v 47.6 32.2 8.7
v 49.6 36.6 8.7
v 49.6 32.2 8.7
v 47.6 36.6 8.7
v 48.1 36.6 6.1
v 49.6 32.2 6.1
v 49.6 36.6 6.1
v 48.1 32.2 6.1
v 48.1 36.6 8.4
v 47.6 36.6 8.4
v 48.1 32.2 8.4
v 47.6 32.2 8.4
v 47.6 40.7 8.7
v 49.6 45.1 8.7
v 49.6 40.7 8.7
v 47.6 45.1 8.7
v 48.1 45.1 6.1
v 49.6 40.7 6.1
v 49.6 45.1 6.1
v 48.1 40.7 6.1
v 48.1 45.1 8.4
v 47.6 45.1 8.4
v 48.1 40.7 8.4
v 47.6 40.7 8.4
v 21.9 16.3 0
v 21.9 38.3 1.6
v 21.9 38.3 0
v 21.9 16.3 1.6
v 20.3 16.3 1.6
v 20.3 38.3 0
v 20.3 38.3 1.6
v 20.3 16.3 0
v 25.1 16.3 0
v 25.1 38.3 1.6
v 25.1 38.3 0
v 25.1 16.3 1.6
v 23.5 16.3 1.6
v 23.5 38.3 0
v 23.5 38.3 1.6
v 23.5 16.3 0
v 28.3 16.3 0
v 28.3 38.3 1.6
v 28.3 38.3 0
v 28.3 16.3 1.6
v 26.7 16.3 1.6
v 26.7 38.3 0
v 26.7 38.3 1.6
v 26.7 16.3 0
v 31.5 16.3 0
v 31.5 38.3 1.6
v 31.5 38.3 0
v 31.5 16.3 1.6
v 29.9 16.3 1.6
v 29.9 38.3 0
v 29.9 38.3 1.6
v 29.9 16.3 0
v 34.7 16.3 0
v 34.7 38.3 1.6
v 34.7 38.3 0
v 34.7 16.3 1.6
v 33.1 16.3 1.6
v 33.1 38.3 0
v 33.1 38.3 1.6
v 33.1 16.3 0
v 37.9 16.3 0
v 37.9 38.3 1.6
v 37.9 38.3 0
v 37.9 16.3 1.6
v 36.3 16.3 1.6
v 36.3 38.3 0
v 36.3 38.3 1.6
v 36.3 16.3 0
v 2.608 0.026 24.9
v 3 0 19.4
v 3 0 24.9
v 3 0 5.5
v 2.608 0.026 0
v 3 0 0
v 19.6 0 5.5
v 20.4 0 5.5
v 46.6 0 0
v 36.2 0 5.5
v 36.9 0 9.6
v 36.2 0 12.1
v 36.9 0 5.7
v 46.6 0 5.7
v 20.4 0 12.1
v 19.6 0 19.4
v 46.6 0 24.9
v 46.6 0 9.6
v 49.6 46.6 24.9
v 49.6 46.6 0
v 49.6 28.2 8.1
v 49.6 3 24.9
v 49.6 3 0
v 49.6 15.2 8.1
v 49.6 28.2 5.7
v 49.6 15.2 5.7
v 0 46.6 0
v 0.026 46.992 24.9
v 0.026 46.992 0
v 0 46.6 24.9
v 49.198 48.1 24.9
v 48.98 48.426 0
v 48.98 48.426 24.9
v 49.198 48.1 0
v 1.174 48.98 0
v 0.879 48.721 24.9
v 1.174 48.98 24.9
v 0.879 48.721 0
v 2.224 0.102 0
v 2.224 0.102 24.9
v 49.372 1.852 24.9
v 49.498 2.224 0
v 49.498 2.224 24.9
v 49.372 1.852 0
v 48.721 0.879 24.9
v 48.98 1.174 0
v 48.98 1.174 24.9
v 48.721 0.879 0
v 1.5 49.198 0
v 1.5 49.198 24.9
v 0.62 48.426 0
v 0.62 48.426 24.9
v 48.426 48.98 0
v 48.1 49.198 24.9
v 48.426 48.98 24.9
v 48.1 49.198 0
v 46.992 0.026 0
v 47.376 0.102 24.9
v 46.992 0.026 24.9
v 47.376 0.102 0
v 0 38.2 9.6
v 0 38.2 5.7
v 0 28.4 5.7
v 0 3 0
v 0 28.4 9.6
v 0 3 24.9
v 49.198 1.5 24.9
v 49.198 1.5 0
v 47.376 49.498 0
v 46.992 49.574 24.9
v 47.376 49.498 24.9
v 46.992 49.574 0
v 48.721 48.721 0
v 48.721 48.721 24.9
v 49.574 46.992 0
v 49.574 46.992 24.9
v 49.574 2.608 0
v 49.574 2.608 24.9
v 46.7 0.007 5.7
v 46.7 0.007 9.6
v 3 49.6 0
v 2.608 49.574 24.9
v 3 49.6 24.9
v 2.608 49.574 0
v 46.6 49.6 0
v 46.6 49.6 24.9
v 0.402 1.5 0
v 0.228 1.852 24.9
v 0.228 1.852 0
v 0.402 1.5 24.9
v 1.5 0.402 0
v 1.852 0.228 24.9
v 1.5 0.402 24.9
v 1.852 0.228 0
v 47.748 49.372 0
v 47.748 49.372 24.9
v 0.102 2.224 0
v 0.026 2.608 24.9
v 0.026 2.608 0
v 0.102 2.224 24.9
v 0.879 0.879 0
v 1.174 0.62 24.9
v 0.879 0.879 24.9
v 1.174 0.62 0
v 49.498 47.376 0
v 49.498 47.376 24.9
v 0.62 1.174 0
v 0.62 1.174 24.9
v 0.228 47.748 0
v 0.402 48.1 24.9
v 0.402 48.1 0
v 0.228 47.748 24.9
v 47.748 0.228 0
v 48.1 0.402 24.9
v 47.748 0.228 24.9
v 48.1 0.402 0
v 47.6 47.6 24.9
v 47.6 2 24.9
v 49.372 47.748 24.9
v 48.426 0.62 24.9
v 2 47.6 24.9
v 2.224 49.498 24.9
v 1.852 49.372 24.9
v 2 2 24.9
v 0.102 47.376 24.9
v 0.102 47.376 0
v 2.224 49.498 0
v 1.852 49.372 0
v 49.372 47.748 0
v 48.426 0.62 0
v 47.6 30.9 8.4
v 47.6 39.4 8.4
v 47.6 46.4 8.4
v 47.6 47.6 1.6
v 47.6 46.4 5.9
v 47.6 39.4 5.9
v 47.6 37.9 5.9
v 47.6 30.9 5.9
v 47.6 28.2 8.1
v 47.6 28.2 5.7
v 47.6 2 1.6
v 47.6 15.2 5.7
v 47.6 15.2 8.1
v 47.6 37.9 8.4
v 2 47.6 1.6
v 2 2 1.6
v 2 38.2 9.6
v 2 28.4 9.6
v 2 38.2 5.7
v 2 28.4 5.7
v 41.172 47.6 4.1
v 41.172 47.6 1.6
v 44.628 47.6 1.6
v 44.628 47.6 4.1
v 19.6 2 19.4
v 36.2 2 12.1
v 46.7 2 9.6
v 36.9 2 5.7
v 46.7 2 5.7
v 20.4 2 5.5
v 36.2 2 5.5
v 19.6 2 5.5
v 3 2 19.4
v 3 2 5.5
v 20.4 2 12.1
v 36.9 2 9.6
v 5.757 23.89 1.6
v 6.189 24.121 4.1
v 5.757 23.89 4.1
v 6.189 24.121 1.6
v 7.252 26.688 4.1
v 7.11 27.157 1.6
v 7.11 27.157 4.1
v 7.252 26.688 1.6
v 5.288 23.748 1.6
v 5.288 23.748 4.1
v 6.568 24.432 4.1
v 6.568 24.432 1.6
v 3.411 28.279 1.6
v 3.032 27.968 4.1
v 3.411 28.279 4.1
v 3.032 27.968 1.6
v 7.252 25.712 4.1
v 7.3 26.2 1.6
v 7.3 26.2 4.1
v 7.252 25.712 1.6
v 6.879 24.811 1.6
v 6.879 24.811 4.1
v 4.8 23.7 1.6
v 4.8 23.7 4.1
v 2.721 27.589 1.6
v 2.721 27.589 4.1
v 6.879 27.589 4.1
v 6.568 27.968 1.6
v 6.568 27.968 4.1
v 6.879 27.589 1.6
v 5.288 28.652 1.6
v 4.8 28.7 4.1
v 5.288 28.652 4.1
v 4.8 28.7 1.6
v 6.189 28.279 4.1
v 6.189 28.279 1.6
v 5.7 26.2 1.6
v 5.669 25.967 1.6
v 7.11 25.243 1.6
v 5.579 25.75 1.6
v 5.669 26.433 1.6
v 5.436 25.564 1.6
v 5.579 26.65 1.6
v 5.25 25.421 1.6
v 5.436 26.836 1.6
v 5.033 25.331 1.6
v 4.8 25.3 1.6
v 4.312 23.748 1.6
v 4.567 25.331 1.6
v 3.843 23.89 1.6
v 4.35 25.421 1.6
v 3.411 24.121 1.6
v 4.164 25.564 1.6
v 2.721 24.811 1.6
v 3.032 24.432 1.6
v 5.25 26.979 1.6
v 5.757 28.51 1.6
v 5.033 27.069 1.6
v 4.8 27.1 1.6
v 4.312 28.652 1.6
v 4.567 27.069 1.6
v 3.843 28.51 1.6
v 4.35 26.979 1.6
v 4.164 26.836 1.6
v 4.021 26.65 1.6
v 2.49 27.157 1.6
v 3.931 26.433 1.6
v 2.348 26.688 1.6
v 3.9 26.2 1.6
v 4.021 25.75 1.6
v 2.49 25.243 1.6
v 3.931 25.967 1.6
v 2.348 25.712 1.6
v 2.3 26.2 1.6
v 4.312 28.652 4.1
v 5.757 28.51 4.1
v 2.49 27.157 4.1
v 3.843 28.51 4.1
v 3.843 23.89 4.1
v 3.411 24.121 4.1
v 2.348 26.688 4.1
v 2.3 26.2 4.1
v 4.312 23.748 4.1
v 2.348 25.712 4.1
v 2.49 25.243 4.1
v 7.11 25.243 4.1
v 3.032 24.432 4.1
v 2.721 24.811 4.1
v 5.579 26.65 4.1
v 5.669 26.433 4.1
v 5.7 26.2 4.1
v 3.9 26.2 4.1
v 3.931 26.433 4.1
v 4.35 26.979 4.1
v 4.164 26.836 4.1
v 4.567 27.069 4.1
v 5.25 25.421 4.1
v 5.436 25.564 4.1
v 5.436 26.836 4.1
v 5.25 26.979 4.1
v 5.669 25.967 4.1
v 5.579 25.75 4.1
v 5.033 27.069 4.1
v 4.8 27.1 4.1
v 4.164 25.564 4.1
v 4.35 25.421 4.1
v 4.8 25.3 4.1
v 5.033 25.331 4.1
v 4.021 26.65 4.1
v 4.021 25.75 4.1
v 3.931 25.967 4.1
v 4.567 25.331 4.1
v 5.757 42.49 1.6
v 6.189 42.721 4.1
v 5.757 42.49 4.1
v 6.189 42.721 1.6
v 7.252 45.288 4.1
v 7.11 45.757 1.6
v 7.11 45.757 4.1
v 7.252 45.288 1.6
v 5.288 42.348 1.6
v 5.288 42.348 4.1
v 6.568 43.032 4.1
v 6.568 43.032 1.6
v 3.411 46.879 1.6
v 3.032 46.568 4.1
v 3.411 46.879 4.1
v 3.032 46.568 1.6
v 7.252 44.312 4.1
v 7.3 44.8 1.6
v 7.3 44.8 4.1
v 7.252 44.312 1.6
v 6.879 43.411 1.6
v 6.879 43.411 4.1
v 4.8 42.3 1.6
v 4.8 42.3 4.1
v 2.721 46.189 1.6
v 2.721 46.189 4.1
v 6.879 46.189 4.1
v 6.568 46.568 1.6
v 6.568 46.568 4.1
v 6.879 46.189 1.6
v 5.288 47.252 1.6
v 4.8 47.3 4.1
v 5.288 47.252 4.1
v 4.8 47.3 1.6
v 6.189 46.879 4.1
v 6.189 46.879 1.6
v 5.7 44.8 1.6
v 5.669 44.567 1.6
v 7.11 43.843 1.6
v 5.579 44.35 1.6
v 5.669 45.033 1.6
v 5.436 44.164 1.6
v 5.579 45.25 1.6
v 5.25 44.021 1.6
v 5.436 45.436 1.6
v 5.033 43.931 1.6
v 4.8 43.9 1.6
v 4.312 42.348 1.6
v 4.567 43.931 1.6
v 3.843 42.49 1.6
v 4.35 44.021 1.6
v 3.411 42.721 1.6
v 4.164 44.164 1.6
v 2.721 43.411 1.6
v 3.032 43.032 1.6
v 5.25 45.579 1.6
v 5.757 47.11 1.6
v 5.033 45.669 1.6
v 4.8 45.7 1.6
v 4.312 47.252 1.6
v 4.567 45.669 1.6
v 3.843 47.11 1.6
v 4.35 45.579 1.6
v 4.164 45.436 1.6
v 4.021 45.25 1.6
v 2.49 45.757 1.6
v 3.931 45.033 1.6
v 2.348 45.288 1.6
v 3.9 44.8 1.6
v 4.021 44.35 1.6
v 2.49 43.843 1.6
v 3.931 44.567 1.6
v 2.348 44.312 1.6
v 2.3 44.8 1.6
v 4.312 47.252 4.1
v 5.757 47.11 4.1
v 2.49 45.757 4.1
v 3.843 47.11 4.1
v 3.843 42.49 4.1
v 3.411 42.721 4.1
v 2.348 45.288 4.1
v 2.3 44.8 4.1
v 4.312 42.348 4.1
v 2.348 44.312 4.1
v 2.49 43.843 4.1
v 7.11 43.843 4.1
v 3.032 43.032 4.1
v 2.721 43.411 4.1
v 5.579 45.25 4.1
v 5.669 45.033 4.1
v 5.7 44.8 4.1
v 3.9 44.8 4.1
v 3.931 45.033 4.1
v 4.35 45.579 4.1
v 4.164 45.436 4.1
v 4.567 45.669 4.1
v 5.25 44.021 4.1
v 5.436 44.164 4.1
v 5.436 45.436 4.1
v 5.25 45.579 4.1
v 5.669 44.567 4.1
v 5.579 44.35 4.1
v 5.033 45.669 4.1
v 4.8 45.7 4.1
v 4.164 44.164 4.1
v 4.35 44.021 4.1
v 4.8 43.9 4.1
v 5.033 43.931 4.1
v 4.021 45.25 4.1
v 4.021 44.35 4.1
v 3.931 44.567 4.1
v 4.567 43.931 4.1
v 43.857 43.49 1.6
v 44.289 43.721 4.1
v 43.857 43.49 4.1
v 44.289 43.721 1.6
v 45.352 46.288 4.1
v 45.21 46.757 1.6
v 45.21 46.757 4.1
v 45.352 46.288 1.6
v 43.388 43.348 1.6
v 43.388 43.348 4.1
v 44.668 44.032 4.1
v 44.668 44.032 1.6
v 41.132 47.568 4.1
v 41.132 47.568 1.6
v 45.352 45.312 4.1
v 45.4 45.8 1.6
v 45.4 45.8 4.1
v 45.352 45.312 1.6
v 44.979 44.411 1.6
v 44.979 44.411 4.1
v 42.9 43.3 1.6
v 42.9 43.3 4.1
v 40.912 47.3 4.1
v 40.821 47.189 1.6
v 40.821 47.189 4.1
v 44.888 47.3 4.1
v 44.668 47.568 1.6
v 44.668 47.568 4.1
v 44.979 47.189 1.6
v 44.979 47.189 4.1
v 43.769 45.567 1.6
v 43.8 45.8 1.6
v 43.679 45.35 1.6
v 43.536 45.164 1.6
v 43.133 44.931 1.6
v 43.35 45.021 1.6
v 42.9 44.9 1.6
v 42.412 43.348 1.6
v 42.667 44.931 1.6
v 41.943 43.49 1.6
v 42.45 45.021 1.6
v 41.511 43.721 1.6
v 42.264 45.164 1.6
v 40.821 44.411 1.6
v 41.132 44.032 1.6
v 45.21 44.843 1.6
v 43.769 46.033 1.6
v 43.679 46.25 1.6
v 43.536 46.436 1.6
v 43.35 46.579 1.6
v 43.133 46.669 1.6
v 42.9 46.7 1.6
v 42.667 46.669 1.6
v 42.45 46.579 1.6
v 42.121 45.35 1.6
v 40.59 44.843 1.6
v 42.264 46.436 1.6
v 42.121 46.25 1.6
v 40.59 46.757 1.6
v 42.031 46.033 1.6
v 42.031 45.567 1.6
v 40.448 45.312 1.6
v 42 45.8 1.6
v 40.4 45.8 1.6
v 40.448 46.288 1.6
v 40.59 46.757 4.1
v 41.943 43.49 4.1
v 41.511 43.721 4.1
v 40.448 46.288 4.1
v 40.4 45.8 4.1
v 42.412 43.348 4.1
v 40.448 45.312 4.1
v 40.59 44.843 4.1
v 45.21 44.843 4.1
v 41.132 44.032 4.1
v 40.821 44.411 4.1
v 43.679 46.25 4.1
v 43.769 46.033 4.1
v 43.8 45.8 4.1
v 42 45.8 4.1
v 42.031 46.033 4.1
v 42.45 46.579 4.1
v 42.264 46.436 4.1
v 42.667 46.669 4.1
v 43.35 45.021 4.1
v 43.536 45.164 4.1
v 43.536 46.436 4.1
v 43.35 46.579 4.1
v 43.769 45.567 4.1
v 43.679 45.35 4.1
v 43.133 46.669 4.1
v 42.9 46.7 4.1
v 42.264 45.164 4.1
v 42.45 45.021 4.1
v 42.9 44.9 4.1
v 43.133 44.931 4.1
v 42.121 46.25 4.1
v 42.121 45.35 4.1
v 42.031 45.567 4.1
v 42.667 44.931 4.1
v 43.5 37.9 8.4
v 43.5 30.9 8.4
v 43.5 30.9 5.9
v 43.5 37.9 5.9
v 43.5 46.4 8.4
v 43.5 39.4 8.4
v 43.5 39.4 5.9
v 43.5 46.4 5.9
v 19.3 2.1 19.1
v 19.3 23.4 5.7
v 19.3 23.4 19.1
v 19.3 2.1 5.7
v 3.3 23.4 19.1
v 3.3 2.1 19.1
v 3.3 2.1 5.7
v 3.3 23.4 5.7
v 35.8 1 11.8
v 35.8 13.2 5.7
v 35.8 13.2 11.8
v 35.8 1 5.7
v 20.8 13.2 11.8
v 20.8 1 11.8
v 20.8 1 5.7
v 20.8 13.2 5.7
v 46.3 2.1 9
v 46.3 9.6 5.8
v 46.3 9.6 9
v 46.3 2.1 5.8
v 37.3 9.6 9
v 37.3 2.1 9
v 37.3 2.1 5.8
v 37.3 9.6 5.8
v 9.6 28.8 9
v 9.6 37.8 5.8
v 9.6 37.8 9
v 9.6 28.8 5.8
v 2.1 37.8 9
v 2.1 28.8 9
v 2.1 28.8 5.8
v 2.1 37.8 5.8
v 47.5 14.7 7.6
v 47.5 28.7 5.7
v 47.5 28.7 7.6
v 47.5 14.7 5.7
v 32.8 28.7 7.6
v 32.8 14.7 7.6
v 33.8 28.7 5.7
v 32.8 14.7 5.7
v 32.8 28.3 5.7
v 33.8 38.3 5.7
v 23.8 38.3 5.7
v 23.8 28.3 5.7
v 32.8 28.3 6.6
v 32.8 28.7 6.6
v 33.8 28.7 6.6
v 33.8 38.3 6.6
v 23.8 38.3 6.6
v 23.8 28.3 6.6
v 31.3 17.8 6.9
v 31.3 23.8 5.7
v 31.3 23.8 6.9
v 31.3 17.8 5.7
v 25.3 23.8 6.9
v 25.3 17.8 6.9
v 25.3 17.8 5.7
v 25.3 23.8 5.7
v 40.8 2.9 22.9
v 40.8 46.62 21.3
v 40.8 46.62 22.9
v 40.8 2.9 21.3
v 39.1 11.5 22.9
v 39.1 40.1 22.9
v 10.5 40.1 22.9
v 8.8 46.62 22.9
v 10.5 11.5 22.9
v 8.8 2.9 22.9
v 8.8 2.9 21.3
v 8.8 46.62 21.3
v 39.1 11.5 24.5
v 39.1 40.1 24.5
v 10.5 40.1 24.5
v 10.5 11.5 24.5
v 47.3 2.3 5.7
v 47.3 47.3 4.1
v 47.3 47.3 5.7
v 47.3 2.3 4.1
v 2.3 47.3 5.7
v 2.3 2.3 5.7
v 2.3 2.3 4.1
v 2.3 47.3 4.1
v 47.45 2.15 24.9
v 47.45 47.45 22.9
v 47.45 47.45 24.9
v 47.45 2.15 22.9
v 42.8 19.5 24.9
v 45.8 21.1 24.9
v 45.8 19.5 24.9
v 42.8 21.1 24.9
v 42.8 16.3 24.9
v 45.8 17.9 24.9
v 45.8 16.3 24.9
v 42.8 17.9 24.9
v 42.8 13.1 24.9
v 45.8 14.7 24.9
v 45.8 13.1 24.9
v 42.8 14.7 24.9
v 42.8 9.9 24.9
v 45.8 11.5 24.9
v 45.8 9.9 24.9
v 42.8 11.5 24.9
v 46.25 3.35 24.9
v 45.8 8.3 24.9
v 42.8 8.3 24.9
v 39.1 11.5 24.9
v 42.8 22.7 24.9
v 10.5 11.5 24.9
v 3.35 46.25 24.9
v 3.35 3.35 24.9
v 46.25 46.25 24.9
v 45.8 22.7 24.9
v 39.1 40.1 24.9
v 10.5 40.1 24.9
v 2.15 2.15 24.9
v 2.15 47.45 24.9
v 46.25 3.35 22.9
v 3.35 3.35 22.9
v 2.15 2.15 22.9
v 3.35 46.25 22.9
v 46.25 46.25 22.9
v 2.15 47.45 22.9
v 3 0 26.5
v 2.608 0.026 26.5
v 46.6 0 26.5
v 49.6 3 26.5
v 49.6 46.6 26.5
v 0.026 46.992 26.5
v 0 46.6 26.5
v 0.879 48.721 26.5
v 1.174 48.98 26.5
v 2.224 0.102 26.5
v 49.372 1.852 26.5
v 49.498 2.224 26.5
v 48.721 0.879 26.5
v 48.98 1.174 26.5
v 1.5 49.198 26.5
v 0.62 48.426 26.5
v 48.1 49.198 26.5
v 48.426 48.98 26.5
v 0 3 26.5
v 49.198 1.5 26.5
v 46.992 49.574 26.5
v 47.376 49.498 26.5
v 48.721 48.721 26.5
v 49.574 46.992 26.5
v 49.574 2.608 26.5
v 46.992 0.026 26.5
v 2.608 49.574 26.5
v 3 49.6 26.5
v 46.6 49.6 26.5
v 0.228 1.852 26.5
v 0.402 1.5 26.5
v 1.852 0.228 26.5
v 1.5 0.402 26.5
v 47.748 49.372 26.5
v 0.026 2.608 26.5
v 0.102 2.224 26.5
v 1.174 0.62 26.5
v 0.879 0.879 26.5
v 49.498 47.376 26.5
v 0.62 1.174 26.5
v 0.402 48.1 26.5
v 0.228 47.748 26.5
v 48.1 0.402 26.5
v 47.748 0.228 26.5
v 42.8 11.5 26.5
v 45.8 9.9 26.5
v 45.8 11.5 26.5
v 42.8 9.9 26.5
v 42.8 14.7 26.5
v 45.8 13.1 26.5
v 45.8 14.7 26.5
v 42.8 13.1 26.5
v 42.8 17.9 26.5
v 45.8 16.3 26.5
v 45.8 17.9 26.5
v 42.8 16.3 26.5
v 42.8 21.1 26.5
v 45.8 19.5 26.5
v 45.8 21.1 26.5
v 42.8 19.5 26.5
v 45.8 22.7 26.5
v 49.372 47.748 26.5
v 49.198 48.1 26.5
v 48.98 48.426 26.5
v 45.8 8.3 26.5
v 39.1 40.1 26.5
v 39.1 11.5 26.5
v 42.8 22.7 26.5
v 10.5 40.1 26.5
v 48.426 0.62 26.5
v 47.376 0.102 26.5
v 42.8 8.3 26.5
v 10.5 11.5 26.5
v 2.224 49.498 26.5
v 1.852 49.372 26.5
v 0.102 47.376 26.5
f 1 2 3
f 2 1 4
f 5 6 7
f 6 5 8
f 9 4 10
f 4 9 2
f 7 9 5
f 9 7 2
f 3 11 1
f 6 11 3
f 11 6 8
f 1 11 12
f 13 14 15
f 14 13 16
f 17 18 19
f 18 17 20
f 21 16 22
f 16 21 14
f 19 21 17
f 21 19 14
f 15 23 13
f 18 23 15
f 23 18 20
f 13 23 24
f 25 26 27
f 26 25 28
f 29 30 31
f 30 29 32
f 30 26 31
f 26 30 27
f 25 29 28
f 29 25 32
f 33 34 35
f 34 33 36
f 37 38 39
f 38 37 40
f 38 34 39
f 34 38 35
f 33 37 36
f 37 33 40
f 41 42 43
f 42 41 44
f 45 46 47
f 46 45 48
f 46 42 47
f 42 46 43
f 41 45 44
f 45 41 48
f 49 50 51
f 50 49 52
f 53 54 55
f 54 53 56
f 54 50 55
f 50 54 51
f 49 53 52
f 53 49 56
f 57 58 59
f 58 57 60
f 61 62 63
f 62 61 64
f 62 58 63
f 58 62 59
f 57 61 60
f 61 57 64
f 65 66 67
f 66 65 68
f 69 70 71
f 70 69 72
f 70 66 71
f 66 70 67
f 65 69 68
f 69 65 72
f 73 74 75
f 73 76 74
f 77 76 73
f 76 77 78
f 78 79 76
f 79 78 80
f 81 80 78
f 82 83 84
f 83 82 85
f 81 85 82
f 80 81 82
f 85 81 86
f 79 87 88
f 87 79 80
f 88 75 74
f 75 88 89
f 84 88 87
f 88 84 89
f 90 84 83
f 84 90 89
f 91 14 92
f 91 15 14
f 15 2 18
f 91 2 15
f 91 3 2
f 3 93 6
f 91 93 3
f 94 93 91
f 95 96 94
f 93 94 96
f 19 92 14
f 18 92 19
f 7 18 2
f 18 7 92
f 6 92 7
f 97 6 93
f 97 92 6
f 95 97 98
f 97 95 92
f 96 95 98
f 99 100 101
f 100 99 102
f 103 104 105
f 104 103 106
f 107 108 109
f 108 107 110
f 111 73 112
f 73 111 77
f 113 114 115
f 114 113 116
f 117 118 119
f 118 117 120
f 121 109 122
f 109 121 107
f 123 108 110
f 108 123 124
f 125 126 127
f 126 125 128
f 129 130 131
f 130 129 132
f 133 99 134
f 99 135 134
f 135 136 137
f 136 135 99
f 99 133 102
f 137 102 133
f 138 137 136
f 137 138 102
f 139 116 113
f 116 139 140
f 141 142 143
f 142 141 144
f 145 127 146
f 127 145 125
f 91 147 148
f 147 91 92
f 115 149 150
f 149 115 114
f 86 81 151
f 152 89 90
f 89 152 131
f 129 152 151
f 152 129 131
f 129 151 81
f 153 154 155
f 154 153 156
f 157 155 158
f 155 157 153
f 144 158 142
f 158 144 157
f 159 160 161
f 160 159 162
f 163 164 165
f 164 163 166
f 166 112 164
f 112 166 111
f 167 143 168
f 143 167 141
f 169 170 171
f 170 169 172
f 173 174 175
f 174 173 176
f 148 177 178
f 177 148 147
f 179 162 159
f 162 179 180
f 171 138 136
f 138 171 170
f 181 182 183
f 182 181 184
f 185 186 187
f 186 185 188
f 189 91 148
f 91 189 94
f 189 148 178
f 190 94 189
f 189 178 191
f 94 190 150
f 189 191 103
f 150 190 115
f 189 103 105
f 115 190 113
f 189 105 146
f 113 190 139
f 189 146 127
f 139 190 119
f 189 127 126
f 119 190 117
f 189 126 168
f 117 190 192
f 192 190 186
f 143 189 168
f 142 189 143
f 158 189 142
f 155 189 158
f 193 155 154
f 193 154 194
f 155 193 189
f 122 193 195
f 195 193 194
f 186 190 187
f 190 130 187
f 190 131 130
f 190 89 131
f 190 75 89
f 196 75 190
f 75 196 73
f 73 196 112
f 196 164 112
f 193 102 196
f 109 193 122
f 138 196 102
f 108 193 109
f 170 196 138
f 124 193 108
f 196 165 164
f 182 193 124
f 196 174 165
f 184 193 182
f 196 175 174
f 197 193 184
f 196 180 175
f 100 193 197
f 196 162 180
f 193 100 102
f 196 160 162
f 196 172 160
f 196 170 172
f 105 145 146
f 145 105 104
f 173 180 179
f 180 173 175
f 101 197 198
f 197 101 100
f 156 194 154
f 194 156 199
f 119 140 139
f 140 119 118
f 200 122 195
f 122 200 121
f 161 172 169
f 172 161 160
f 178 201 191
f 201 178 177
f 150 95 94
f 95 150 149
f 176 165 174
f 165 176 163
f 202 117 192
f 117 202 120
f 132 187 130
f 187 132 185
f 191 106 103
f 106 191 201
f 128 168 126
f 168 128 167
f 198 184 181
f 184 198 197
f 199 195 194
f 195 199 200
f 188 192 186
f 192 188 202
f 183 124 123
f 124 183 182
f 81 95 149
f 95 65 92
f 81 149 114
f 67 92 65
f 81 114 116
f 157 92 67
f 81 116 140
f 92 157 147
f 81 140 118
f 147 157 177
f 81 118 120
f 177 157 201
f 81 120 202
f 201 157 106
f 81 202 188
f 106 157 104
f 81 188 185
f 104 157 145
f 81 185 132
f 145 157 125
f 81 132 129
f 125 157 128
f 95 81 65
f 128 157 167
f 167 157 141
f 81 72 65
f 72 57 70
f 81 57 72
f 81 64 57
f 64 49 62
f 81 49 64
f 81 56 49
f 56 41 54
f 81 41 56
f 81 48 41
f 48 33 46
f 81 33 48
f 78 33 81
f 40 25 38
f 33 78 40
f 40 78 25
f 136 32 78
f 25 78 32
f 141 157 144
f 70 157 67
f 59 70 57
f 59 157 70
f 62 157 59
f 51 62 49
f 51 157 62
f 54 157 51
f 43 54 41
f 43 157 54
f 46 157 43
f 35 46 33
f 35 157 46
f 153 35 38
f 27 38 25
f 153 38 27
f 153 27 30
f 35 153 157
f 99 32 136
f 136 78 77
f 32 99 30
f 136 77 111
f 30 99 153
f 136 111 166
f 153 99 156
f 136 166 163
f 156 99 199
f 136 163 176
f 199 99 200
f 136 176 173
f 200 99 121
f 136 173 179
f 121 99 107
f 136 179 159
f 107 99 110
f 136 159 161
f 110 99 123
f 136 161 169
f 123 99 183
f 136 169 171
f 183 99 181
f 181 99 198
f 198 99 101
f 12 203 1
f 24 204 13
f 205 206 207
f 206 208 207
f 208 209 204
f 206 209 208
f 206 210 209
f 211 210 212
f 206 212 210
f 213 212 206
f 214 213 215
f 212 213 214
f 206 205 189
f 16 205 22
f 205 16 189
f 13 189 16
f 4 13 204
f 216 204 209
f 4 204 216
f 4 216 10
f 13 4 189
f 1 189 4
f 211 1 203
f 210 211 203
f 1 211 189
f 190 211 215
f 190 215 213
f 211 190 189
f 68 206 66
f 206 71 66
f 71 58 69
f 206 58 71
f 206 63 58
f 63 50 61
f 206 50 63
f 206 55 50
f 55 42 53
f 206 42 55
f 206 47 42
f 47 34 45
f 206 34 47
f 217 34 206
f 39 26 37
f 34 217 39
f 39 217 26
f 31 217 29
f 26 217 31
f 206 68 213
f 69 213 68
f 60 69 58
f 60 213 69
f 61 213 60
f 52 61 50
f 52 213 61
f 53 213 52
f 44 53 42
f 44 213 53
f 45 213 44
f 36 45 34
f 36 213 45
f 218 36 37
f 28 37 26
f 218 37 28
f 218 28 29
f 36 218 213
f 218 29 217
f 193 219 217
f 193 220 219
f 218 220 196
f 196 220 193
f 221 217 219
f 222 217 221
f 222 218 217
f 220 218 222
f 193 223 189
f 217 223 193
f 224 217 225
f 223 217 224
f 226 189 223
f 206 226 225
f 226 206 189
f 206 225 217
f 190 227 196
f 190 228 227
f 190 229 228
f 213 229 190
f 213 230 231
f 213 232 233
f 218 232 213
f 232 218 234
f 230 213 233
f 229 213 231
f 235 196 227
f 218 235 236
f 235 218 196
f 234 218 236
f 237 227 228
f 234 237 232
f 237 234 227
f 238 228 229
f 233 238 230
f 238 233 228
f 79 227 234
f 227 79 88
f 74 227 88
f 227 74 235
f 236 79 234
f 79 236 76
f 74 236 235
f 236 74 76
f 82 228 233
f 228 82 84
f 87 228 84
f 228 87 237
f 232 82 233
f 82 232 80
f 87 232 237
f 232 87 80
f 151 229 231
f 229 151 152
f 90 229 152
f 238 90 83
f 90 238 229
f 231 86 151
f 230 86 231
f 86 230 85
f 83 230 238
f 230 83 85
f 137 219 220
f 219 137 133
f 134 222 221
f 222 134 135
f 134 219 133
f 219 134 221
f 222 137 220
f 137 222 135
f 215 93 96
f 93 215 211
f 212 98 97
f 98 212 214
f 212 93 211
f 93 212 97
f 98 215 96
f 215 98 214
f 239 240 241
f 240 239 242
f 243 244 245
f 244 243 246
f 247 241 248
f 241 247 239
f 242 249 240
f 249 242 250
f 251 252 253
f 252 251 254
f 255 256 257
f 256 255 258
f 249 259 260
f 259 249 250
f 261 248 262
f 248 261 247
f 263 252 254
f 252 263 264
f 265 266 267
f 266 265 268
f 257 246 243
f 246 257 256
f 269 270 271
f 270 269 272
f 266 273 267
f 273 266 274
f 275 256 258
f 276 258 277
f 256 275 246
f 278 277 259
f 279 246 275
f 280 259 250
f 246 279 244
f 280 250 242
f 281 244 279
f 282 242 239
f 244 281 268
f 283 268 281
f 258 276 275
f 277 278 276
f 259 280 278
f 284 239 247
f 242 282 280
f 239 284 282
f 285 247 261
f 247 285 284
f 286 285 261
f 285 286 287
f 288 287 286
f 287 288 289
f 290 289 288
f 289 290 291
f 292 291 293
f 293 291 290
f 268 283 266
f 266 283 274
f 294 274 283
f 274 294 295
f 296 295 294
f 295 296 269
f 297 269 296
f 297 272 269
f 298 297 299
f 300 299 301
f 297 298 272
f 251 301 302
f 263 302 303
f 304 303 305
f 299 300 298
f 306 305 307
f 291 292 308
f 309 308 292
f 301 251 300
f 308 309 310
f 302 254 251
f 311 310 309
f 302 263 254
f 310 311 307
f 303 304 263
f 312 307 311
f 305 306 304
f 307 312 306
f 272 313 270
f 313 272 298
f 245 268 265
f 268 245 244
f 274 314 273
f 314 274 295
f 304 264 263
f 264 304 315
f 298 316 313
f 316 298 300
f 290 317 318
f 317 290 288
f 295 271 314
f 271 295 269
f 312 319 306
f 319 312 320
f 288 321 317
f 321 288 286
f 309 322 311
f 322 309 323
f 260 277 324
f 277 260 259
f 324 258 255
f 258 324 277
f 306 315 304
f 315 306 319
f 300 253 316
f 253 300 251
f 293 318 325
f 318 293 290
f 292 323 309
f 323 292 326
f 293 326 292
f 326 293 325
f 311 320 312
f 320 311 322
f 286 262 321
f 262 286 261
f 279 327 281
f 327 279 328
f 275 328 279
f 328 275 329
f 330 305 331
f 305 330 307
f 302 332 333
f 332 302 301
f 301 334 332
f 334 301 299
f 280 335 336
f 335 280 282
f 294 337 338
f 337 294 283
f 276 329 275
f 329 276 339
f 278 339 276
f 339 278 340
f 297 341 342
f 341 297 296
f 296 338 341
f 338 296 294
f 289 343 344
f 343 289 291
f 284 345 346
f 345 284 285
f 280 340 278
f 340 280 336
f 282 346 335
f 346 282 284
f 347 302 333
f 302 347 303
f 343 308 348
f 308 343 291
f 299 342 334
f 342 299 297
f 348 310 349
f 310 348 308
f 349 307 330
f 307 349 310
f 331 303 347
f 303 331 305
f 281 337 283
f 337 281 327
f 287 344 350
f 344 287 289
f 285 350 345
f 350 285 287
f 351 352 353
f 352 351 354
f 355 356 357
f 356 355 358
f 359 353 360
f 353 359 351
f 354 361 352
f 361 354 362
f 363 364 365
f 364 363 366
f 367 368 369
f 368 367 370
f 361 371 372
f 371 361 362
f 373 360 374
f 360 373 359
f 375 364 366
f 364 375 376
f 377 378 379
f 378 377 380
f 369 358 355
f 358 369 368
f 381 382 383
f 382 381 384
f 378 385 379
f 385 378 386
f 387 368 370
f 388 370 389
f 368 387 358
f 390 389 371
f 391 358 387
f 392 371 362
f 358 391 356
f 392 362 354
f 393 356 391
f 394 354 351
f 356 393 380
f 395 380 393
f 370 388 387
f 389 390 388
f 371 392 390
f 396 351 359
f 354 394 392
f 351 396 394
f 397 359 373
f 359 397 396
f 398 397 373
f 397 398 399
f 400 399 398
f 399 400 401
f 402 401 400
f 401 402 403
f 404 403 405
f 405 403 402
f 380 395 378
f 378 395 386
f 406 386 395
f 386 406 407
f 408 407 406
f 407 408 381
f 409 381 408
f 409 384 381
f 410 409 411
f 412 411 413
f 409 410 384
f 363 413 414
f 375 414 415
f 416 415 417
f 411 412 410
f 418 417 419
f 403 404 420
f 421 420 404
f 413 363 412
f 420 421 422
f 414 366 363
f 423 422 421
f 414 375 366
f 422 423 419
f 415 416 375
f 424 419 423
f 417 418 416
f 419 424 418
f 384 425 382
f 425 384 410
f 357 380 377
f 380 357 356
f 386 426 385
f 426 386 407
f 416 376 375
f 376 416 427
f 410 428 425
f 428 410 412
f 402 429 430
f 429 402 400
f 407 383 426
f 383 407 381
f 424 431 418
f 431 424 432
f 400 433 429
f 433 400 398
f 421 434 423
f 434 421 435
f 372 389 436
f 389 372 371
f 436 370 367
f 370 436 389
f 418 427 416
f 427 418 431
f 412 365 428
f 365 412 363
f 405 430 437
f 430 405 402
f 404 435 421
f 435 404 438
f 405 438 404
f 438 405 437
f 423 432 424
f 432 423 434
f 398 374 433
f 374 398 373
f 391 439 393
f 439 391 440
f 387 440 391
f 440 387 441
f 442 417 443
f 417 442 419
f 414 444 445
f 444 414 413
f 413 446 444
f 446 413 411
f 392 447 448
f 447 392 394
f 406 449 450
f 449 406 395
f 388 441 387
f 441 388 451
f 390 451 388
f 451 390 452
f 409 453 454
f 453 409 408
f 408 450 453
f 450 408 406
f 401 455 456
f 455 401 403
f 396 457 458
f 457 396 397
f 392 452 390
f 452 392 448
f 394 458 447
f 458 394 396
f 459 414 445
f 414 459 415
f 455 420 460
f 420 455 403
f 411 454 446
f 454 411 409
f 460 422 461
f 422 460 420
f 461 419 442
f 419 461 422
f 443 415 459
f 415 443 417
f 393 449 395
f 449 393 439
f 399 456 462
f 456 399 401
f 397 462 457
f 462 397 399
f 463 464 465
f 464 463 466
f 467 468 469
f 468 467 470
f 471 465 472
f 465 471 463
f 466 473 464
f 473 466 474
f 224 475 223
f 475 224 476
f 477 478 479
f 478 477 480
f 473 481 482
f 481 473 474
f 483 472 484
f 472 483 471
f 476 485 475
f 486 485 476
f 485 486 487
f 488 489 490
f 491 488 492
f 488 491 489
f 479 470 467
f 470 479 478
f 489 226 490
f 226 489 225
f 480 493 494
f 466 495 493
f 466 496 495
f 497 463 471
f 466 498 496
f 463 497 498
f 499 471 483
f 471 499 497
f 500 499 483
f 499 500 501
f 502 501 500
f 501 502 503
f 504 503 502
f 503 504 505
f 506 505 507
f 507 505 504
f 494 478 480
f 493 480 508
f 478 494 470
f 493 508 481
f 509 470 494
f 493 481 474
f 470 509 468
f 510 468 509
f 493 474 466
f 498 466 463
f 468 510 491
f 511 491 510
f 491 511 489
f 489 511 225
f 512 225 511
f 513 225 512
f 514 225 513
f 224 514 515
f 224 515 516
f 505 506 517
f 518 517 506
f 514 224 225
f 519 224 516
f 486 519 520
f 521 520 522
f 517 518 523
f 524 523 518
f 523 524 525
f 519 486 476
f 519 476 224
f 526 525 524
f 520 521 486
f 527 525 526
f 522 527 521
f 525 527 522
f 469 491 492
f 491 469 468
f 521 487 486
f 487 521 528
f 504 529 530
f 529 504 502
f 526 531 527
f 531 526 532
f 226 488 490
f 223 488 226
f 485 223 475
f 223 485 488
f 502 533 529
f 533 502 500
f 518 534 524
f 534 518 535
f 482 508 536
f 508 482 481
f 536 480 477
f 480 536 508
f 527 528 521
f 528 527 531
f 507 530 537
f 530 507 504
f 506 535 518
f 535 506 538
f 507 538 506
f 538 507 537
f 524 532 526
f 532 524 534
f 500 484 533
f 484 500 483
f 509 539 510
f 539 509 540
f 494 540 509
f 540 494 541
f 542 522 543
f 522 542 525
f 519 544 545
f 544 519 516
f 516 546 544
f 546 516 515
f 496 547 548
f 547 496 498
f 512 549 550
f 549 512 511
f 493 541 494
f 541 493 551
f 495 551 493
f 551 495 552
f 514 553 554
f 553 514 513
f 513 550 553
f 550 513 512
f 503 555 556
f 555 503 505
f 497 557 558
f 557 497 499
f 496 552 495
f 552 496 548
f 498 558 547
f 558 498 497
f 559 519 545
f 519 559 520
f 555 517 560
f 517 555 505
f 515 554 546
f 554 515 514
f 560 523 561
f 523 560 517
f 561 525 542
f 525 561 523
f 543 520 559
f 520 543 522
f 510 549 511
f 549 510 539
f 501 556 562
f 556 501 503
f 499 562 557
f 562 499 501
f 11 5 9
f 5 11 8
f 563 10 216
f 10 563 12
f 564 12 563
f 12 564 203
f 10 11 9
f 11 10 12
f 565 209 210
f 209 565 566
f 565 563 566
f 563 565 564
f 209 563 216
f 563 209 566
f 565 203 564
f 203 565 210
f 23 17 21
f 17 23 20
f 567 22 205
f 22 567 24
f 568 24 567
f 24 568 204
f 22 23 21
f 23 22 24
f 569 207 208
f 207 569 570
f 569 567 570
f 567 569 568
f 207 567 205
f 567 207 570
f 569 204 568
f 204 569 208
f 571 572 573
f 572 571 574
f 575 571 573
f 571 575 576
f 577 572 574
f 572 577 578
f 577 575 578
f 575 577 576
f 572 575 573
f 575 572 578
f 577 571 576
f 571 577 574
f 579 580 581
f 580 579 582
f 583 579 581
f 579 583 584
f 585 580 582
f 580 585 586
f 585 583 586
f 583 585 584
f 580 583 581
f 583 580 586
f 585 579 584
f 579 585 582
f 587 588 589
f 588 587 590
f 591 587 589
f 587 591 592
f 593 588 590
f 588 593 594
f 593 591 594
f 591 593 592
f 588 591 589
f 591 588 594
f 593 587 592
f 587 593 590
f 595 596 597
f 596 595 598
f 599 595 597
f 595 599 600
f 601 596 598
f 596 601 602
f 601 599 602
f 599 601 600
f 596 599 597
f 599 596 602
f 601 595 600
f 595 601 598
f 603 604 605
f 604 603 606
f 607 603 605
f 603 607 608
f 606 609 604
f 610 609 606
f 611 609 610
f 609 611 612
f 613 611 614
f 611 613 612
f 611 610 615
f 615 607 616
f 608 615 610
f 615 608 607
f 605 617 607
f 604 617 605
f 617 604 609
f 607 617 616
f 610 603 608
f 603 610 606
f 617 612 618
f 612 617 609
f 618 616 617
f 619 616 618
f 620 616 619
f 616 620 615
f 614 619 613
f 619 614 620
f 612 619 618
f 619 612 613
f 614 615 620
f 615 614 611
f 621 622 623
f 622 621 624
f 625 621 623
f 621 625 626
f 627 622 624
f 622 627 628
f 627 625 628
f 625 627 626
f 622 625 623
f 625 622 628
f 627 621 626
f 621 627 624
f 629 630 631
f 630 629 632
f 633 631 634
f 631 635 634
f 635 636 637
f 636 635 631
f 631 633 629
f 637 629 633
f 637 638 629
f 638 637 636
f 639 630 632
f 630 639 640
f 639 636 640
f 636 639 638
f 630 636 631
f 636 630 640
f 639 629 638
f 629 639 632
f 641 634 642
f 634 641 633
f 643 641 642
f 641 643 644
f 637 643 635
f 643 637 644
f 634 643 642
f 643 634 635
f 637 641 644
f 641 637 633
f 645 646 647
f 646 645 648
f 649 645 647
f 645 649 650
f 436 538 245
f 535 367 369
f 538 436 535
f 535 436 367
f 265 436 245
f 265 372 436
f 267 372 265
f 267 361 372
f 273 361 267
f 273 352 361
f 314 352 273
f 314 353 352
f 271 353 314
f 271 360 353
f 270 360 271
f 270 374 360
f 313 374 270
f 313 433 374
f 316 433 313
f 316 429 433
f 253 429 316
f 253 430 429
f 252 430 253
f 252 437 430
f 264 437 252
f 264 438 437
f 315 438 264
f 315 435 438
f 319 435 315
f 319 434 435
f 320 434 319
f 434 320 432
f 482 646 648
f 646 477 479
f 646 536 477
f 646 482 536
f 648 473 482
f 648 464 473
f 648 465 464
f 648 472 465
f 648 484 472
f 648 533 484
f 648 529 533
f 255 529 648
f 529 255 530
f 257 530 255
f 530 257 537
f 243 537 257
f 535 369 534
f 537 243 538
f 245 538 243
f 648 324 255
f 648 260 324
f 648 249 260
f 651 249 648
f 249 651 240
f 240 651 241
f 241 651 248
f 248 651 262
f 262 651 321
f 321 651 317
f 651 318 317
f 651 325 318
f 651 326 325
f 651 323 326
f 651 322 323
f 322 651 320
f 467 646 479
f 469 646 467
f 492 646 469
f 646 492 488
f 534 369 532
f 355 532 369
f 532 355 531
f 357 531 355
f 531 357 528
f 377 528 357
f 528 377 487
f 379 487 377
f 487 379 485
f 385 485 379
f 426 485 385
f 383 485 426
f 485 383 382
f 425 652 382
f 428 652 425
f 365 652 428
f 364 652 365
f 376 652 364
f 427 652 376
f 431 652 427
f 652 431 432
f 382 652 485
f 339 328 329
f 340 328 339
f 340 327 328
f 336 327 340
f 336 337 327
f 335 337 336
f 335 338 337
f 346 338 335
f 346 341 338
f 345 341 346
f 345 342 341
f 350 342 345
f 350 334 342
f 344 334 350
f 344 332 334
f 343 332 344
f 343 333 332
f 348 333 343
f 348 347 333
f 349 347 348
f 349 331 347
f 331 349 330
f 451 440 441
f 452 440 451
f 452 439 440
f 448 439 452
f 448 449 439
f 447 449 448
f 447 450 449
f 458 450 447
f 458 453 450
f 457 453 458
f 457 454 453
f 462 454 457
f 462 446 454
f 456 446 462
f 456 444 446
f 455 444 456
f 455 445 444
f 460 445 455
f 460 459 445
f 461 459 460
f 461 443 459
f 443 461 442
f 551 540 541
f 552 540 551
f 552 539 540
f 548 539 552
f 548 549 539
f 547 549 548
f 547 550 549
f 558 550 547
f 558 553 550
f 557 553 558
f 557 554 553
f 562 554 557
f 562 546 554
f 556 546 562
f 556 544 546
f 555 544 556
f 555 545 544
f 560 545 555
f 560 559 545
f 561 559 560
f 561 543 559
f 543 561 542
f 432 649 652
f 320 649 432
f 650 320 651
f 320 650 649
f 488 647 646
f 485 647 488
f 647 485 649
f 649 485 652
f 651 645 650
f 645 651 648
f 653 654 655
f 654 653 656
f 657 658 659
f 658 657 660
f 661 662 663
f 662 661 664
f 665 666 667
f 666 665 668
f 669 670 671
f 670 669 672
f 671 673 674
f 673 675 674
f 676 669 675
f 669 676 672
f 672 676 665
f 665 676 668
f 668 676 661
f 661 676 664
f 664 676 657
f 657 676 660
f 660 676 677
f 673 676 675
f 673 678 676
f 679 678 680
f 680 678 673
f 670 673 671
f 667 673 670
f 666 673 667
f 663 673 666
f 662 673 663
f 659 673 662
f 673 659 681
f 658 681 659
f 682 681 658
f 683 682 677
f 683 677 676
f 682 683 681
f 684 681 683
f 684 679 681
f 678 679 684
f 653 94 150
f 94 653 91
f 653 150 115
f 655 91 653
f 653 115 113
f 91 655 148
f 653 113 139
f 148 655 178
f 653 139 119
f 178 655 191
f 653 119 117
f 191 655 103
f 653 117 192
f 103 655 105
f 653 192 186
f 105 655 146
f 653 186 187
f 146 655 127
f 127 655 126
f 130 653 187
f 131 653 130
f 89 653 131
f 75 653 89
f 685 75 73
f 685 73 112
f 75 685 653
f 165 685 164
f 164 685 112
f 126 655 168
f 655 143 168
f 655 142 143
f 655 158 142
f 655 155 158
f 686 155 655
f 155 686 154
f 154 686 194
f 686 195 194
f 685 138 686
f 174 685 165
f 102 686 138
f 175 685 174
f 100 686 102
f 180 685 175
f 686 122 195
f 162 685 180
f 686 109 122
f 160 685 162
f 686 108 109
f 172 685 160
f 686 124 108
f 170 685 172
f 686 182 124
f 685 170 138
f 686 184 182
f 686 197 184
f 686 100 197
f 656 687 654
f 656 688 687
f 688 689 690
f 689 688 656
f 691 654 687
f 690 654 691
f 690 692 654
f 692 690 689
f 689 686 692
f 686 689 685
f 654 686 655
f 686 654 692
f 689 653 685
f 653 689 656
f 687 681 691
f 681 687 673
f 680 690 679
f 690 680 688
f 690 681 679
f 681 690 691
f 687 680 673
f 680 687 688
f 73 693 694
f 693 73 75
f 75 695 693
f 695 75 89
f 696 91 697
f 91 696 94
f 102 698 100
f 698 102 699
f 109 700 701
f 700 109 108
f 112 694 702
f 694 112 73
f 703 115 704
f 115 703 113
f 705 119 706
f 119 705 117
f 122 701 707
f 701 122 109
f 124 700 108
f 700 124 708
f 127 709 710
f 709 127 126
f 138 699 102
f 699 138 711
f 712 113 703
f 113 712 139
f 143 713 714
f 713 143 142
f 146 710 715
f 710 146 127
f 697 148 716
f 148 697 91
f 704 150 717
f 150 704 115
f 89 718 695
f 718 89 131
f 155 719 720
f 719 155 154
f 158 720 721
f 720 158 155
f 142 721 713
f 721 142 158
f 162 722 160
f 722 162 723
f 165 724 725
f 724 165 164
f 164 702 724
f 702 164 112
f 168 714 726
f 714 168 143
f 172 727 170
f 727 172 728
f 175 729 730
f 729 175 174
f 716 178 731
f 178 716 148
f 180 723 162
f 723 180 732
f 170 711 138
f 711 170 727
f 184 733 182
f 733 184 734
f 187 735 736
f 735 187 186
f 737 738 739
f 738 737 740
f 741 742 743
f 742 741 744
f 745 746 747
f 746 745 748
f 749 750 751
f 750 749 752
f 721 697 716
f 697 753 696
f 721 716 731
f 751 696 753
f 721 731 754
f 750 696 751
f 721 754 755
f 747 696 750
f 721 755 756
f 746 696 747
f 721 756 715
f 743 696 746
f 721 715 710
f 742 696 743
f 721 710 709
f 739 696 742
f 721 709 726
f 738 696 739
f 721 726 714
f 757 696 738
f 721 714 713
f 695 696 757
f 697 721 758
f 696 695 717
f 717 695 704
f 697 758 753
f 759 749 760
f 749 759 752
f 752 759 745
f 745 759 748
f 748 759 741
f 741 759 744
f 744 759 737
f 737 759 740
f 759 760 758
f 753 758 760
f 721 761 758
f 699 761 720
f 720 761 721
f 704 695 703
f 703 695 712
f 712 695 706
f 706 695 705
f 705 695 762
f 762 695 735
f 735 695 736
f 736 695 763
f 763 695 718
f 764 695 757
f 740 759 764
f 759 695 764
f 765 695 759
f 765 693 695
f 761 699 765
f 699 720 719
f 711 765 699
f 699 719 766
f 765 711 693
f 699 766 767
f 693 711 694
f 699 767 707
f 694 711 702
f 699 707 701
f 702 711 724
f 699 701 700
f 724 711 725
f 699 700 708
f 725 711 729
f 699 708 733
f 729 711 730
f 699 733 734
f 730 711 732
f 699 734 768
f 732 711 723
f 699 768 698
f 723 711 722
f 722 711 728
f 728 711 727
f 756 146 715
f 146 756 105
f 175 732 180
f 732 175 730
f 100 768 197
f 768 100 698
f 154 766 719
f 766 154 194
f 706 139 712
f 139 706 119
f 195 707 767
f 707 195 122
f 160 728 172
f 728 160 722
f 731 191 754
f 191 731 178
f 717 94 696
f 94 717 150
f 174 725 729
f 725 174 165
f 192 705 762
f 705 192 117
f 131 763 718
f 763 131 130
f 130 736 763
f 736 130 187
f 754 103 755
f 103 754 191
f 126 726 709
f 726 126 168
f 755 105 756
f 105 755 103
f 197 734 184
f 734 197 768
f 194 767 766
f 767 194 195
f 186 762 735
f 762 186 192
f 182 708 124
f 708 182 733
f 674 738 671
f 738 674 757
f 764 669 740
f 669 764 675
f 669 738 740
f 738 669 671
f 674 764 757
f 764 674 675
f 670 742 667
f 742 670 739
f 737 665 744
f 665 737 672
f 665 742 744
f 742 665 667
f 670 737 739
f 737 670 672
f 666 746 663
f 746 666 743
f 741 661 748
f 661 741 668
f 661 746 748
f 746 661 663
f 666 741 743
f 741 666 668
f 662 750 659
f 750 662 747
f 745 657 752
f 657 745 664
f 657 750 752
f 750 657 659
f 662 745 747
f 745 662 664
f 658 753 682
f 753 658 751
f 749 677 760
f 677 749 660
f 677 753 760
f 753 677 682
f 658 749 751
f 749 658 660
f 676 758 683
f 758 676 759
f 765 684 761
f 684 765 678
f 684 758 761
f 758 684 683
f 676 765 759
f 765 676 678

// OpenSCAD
// openKVM v1 - boitier CONCEPT (apercu, pas un fichier d'impression final)
// CERN-OHL-S-2.0. Toutes les cotes sont en mm et seront figees au livrable 7,
// une fois le PCB route. Repere : origine = coin arriere gauche du PCB,
// X vers la droite, Y vers l'avant, Z vers le haut.

/* [Carte] */
pcb = [45, 45, 1.6];      // contour du pre-placement KiCad
jeu = 0.3;                // jeu PCB / paroi
/* [Boitier] */
paroi = 2.0;
fond = 1.6;
entretoise = 2.5;         // sous le PCB (soudures des broches du RJ45)
capot = 1.6;
h_interne = 19.2;         // du dessus du PCB au dessous du capot
/* [Vue] */
vue = "assemble";         // [assemble, eclate, coque]
montrer_carte = true;

z_pcb = fond + entretoise + pcb[2];              // dessus du PCB
ext = [pcb[0] + 2*(jeu + paroi), pcb[1] + 2*(jeu + paroi), z_pcb + h_interne + capot];
o = jeu + paroi;                                  // decalage PCB -> exterieur

// Decoupes : [centre le long de la face, largeur, bas au-dessus du PCB, hauteur]
rj45   = [ 9.0, 16.6, -0.2, 13.9];   // face arriere
hdmi   = [26.0, 15.8, -0.2,  6.6];   // face arriere
usb_c  = [39.5,  9.8,  0.0,  3.9];   // face arriere (CIBLE)
usb_e  = [31.0,  9.8,  0.0,  3.9];   // face gauche (EXT)
sd     = [19.4, 13.0,  0.0,  2.4];   // face droite
btn    = [[32.1, 4.4, 0.4, 2.6], [40.6, 4.4, 0.4, 2.6]];   // face droite
ecran  = [22.5, 23.5, 28.6, 28.6];   // fenetre du capot : centre X, centre Y, L, l
trous  = [[2.5, 23.9], [2.5, 42.5], [40.6, 43.5]];          // vis M2

module arrondi(d, r = 3) {
  hull() for (x = [r, d[0]-r], y = [r, d[1]-r]) translate([x, y, 0]) cylinder(r = r, h = d[2], $fn = 48);
}

module decoupe_y(c, y) {   // dans une paroi perpendiculaire a Y
  translate([o + c[0] - c[1]/2, y - 0.1, z_pcb + c[2]]) cube([c[1], paroi + 0.2, c[3]]);
}
module decoupe_x(c, x) {   // dans une paroi perpendiculaire a X
  translate([x - 0.1, o + c[0] - c[1]/2, z_pcb + c[2]]) cube([paroi + 0.2, c[1], c[3]]);
}

module coque() {
  difference() {
    arrondi([ext[0], ext[1], ext[2] - capot]);
    translate([paroi, paroi, fond]) cube([ext[0] - 2*paroi, ext[1] - 2*paroi, ext[2]]);
    decoupe_y(rj45, 0); decoupe_y(hdmi, 0); decoupe_y(usb_c, 0);
    decoupe_x(usb_e, 0);
    decoupe_x(sd, ext[0] - paroi);
    for (b = btn) decoupe_x(b, ext[0] - paroi);
    // aerations sous les puces chaudes (P4 et TC358743)
    for (i = [0:5]) translate([o + 18 + i*3.2, o + 14, -0.1]) cube([1.6, 22, fond + 0.2]);
  }
  // plots de fixation
  for (t = trous) translate([o + t[0], o + t[1], fond]) difference() {
    cylinder(d = 5, h = entretoise, $fn = 32);
    translate([0, 0, -0.1]) cylinder(d = 1.8, h = entretoise + 0.2, $fn = 24);
  }
}

module couvercle() {
  translate([0, 0, ext[2] - capot]) difference() {
    union() {
      arrondi([ext[0], ext[1], capot]);
      translate([paroi + 0.15, paroi + 0.15, -2]) difference() {   // levre d'emboitement
        cube([ext[0] - 2*paroi - 0.3, ext[1] - 2*paroi - 0.3, 2]);
        translate([1.2, 1.2, -0.1]) cube([ext[0] - 2*paroi - 2.7, ext[1] - 2*paroi - 2.7, 2.2]);
      }
    }
    translate([o + ecran[0] - ecran[2]/2, o + ecran[1] - ecran[3]/2, -0.1]) cube([ecran[2], ecran[3], capot + 0.2]);
    for (i = [0:4]) translate([o + 40.5, o + 6 + i*3.2, -0.1]) cube([3, 1.6, capot + 0.2]);
  }
}

module carte() {   // volumes simplifies, pour situer les decoupes
  translate([o, o, z_pcb - pcb[2]]) {
    color("#1f5c3a") cube(pcb);
    translate([0, 0, pcb[2]]) {
      color("#b8b8b8") translate([1, -0.2, 0]) cube([16, 21.3, 13.4]);          // RJ45
      color("#cfcabd") translate([18.5, -1.3, 0]) cube([15, 12.2, 6.1]);        // HDMI
      color("#e8e8e8") translate([35, -0.2, 0.1]) cube([9, 7.5, 3.2]);          // USB-C CIBLE
      color("#e8e8e8") translate([-0.2, 26.5, 0.1]) cube([7.5, 9, 3.2]);        // USB-C EXT
      color("#d0d0d0") translate([30.5, 12.4, 0]) cube([14.7, 14, 1.9]);          // microSD
      color("#303030") translate([21.5, 26, 0]) cube([10, 10, 0.9]);            // ESP32-P4
      color("#303030") translate([23, 15.5, 0]) cube([6, 6, 1.2]);              // TC358743
      for (y = [32.1, 40.6]) color("#f0f0f0") translate([41.2, y - 3.5, 0.2]) cube([4.6, 7, 2.5]);
      // module ecran MSP1541 (32 x 43,72 mm), pose sous le capot
      color("#204080") translate([6.5, 0.6, h_interne - 3.6]) cube([32, 43.72, 1.6]);
      color("#101010") translate([8.2, 9.2, h_interne - 2.0]) cube([28.6, 28.6, 1.6]);
    }
  }
}

if (vue == "coque") { color("#e9e4d8") coque(); if (montrer_carte) carte(); }
else if (vue == "eclate") {
  color("#e9e4d8") coque();
  if (montrer_carte) translate([0, 0, 12]) carte();
  color("#e9e4d8") translate([0, 0, 36]) couvercle();
} else {
  color("#e9e4d8") coque();
  if (montrer_carte) carte();
  color("#e9e4d8") couvercle();
}
echo(dimensions_exterieures = ext);
